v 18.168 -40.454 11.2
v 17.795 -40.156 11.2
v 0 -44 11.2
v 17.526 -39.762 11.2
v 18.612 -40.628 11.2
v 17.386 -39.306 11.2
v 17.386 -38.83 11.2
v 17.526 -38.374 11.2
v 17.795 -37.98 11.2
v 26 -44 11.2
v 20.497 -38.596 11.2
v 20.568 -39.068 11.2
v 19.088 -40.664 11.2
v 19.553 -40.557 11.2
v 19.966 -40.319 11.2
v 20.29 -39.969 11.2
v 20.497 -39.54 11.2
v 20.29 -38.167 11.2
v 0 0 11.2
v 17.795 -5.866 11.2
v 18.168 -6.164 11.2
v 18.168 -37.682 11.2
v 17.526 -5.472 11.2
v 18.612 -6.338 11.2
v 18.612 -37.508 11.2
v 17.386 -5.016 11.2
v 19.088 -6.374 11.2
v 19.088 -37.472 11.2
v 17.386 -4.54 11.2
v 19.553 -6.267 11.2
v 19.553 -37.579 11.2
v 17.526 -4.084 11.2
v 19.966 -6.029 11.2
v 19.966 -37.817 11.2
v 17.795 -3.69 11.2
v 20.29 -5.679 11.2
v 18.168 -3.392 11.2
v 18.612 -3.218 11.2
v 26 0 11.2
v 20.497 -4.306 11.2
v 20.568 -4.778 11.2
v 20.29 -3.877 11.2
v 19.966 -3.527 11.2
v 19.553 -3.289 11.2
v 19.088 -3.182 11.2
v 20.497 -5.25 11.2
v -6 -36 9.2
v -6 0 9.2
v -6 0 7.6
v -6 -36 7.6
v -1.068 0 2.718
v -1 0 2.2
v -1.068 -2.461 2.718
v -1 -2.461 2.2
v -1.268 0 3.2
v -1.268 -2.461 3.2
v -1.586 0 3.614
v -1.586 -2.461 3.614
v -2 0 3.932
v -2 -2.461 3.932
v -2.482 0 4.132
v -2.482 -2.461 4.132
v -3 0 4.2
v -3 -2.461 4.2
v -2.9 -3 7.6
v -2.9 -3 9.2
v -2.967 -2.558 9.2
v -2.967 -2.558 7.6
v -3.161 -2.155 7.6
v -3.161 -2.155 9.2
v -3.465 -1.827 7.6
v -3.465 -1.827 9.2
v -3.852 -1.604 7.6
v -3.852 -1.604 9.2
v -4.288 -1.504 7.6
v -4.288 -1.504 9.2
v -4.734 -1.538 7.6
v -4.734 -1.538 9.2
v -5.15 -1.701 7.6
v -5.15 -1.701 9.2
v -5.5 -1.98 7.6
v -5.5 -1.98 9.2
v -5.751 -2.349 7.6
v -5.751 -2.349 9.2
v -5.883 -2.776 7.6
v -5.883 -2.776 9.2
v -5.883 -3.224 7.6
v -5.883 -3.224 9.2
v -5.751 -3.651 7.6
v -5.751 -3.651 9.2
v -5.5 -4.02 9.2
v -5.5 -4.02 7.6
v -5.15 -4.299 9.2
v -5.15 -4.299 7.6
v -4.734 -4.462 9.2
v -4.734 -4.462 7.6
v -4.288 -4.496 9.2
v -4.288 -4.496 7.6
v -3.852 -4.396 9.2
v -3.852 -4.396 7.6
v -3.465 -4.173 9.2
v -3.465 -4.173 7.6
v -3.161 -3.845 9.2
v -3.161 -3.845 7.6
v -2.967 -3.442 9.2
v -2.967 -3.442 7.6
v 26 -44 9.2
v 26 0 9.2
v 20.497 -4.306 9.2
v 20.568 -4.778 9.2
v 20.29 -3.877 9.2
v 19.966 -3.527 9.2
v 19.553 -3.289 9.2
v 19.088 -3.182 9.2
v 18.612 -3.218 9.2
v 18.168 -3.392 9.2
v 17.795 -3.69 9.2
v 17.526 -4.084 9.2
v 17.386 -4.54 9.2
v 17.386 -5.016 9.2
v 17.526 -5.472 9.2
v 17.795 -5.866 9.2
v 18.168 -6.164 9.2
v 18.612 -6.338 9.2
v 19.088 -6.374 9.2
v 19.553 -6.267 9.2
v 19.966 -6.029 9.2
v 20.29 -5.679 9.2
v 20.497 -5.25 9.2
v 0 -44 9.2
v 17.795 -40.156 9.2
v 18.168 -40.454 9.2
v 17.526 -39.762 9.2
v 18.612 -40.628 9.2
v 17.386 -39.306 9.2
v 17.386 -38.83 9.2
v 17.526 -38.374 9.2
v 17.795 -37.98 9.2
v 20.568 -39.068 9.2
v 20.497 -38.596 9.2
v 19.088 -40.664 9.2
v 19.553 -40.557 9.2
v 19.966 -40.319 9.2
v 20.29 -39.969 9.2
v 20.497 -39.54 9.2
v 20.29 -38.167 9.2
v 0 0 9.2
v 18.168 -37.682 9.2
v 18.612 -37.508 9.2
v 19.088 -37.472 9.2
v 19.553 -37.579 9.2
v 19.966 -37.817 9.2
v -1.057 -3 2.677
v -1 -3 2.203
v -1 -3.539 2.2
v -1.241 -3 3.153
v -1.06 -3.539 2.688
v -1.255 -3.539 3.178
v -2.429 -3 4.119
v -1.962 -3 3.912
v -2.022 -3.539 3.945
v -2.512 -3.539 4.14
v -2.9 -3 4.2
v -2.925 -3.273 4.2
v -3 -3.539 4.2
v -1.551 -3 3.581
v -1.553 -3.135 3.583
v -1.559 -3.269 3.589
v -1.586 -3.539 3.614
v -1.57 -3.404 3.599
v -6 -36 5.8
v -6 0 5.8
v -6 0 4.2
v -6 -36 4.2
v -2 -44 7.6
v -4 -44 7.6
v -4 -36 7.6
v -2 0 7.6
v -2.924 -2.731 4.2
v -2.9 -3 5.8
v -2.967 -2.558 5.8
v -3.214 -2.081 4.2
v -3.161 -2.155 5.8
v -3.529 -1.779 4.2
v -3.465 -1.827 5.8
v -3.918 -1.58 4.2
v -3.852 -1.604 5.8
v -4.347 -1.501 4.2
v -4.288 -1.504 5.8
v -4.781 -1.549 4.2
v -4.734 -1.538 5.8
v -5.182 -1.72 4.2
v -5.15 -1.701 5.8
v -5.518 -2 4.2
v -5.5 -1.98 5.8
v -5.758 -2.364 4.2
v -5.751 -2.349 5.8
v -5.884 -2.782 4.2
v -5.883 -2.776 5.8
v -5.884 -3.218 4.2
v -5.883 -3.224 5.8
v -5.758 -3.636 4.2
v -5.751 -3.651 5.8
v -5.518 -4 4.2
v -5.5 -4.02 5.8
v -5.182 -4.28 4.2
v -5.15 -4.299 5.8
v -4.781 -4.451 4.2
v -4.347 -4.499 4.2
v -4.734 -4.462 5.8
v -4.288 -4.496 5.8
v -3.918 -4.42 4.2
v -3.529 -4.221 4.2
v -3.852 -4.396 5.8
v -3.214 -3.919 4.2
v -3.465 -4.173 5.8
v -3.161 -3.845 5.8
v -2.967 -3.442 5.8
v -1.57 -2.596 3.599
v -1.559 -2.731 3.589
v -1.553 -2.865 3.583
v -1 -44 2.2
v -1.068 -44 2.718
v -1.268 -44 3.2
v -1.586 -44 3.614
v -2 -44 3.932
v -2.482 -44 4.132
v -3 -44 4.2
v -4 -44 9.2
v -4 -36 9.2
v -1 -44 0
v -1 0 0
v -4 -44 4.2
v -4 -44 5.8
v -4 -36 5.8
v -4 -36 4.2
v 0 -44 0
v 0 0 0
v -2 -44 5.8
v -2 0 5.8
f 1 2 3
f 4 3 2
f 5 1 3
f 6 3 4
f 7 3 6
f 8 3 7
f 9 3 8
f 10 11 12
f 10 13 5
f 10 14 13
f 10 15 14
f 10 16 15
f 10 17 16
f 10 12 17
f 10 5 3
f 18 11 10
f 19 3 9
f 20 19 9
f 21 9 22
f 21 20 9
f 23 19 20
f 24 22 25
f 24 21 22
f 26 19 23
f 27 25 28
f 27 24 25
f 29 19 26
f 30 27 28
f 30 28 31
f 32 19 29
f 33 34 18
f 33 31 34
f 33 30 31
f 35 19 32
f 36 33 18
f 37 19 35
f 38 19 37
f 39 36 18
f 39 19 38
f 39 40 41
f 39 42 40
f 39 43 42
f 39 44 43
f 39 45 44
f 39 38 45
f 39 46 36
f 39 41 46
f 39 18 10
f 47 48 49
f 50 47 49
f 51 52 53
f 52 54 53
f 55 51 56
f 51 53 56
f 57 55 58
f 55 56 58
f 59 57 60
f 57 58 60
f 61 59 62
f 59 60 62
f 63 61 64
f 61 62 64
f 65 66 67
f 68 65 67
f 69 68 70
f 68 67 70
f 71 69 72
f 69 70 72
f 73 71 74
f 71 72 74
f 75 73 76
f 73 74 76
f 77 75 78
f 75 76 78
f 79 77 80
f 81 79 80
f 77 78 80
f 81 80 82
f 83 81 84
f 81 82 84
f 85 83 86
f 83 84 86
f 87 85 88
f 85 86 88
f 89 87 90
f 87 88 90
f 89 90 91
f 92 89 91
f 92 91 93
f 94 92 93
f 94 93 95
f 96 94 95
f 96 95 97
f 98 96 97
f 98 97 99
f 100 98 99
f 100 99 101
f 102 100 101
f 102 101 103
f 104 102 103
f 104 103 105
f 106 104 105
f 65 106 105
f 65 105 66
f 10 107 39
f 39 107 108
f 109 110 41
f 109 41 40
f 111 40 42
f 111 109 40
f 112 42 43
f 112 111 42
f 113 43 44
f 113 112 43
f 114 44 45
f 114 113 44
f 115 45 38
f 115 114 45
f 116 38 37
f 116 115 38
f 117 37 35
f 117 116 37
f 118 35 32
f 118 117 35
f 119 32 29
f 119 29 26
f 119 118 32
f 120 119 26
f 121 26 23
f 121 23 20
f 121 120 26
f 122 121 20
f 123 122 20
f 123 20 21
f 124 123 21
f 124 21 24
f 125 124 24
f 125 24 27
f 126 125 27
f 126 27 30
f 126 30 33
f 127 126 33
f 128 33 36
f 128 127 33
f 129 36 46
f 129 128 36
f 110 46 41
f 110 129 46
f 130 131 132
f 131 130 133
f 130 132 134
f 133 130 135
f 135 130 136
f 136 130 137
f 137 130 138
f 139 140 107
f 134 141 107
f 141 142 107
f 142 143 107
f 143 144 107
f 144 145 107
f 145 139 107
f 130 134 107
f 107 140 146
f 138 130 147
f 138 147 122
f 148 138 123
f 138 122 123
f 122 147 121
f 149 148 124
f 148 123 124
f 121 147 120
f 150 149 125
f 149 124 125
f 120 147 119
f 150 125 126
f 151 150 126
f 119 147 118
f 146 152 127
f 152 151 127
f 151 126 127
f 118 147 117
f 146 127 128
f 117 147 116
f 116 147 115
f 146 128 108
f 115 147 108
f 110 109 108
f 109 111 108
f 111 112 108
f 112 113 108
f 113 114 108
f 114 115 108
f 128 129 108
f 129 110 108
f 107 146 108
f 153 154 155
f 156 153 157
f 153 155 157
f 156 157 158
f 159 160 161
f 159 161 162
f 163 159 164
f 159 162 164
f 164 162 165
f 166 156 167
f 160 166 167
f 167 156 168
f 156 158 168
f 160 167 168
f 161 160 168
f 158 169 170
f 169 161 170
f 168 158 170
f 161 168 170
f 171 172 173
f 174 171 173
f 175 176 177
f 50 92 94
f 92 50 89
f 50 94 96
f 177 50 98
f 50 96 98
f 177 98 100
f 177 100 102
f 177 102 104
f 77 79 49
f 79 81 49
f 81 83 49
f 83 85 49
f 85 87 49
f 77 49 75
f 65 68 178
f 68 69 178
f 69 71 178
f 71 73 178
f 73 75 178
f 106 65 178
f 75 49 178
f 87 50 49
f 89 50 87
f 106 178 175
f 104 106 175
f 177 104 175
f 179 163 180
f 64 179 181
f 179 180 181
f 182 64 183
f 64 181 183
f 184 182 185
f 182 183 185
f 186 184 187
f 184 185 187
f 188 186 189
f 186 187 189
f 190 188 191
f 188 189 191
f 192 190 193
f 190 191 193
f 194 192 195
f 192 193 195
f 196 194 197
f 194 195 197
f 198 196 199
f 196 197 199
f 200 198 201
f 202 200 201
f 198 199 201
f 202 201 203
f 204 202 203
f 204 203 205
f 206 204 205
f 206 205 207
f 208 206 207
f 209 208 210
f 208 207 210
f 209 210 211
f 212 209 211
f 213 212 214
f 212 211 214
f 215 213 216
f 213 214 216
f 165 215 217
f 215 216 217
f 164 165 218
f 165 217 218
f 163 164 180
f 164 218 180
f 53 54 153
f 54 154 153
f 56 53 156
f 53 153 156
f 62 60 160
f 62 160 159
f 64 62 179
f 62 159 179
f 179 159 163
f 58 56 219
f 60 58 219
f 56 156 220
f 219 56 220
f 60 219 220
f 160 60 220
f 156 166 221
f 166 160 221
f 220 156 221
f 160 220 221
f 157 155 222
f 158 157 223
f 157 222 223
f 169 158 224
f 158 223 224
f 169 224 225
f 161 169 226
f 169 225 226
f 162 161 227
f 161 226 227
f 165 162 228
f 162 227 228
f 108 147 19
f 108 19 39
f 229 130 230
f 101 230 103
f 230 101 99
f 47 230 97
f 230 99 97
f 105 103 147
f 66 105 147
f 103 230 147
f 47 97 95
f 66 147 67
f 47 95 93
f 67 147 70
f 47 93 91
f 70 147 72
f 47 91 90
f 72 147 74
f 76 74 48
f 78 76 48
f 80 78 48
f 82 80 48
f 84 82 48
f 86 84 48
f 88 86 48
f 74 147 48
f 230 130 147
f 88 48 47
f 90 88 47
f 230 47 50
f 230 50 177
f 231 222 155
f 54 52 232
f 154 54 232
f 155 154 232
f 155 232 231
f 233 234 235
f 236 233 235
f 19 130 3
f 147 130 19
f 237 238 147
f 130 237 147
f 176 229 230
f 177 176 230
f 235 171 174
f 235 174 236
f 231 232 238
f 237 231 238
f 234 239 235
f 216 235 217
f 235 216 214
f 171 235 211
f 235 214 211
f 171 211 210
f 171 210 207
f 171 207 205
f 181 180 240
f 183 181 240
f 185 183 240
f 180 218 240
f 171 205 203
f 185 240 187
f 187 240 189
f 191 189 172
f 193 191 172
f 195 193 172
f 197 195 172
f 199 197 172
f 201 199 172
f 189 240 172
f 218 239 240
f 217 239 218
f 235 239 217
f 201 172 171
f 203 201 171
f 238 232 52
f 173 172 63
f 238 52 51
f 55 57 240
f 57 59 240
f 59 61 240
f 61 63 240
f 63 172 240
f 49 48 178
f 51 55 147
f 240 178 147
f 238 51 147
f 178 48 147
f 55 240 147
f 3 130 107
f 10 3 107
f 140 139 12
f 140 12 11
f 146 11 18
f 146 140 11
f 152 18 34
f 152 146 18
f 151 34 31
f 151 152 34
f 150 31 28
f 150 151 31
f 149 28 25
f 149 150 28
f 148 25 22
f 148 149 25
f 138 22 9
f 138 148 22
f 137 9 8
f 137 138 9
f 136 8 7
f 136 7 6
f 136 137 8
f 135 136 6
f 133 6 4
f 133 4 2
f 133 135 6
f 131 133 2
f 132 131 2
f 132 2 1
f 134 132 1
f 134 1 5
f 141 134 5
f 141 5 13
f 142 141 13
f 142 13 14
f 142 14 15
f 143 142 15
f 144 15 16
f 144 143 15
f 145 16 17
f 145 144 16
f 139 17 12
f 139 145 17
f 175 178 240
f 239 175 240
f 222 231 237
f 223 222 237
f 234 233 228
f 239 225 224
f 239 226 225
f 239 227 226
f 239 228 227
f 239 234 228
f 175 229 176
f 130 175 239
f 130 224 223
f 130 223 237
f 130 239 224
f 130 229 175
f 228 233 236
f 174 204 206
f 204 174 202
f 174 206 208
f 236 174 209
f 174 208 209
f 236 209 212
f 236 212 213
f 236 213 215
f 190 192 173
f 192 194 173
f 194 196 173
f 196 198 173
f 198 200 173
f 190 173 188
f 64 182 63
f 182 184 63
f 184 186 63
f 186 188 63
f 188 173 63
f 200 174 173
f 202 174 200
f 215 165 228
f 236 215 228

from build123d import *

# Parameters (mm, degrees)
F1_DEPTH = 44
F2_R     = 1.5
F3_DEPTH = 9.201
F4_W     = 2
F4_H     = 8
F5_DEPTH = 9.201
F6_R     = 2
F7_W     = 26
F7_H     = 44
F7_R     = 1.6
F8_DEPTH = 2


with BuildPart() as f1:
    # F0 (on Front) → F1 (new body)
    with BuildSketch(Plane.XZ):
        Polygon((-1, 0), (0, 0), (0, 9.2), (-6, 9.2), (-6, 7.6), (-2, 7.6), (-2, 5.8), (-6, 5.8), (-6, 4.2), (-1, 4.2), align=None)
    extrude(amount=F1_DEPTH)

    # F2 (on face) → F3 (cut, through all)
    with BuildSketch(Plane.XY.offset(9.2)):
        with Locations((-4.4, -3)):
            Circle(F2_R)
    extrude(amount=-F3_DEPTH, mode=Mode.SUBTRACT)

    # F4 (on face) → F5 (cut, through all)
    with BuildSketch(Plane.XY.offset(9.2)):
        with Locations((-5, -40)):
            Rectangle(F4_W, F4_H)
    extrude(amount=-F5_DEPTH, mode=Mode.SUBTRACT)

    # F6
    f6_edges = [f1.edges().sort_by_distance(p)[0] for p in [
        (-1, -22, 4.2),
    ]]
    fillet(f6_edges, radius=F6_R)


with BuildPart() as f8:
    # F7 (on face) → F8 (new body)
    with BuildSketch(Plane.XY.offset(9.2)):
        with Locations((13, -22)):
            Rectangle(F7_W, F7_H)
        with Locations((18.968, -39.068)):
            Circle(F7_R, mode=Mode.SUBTRACT)
        with Locations((18.968, -4.778)):
            Circle(F7_R, mode=Mode.SUBTRACT)
    extrude(amount=F8_DEPTH)


solid = Compound([f1.part, f8.part])
